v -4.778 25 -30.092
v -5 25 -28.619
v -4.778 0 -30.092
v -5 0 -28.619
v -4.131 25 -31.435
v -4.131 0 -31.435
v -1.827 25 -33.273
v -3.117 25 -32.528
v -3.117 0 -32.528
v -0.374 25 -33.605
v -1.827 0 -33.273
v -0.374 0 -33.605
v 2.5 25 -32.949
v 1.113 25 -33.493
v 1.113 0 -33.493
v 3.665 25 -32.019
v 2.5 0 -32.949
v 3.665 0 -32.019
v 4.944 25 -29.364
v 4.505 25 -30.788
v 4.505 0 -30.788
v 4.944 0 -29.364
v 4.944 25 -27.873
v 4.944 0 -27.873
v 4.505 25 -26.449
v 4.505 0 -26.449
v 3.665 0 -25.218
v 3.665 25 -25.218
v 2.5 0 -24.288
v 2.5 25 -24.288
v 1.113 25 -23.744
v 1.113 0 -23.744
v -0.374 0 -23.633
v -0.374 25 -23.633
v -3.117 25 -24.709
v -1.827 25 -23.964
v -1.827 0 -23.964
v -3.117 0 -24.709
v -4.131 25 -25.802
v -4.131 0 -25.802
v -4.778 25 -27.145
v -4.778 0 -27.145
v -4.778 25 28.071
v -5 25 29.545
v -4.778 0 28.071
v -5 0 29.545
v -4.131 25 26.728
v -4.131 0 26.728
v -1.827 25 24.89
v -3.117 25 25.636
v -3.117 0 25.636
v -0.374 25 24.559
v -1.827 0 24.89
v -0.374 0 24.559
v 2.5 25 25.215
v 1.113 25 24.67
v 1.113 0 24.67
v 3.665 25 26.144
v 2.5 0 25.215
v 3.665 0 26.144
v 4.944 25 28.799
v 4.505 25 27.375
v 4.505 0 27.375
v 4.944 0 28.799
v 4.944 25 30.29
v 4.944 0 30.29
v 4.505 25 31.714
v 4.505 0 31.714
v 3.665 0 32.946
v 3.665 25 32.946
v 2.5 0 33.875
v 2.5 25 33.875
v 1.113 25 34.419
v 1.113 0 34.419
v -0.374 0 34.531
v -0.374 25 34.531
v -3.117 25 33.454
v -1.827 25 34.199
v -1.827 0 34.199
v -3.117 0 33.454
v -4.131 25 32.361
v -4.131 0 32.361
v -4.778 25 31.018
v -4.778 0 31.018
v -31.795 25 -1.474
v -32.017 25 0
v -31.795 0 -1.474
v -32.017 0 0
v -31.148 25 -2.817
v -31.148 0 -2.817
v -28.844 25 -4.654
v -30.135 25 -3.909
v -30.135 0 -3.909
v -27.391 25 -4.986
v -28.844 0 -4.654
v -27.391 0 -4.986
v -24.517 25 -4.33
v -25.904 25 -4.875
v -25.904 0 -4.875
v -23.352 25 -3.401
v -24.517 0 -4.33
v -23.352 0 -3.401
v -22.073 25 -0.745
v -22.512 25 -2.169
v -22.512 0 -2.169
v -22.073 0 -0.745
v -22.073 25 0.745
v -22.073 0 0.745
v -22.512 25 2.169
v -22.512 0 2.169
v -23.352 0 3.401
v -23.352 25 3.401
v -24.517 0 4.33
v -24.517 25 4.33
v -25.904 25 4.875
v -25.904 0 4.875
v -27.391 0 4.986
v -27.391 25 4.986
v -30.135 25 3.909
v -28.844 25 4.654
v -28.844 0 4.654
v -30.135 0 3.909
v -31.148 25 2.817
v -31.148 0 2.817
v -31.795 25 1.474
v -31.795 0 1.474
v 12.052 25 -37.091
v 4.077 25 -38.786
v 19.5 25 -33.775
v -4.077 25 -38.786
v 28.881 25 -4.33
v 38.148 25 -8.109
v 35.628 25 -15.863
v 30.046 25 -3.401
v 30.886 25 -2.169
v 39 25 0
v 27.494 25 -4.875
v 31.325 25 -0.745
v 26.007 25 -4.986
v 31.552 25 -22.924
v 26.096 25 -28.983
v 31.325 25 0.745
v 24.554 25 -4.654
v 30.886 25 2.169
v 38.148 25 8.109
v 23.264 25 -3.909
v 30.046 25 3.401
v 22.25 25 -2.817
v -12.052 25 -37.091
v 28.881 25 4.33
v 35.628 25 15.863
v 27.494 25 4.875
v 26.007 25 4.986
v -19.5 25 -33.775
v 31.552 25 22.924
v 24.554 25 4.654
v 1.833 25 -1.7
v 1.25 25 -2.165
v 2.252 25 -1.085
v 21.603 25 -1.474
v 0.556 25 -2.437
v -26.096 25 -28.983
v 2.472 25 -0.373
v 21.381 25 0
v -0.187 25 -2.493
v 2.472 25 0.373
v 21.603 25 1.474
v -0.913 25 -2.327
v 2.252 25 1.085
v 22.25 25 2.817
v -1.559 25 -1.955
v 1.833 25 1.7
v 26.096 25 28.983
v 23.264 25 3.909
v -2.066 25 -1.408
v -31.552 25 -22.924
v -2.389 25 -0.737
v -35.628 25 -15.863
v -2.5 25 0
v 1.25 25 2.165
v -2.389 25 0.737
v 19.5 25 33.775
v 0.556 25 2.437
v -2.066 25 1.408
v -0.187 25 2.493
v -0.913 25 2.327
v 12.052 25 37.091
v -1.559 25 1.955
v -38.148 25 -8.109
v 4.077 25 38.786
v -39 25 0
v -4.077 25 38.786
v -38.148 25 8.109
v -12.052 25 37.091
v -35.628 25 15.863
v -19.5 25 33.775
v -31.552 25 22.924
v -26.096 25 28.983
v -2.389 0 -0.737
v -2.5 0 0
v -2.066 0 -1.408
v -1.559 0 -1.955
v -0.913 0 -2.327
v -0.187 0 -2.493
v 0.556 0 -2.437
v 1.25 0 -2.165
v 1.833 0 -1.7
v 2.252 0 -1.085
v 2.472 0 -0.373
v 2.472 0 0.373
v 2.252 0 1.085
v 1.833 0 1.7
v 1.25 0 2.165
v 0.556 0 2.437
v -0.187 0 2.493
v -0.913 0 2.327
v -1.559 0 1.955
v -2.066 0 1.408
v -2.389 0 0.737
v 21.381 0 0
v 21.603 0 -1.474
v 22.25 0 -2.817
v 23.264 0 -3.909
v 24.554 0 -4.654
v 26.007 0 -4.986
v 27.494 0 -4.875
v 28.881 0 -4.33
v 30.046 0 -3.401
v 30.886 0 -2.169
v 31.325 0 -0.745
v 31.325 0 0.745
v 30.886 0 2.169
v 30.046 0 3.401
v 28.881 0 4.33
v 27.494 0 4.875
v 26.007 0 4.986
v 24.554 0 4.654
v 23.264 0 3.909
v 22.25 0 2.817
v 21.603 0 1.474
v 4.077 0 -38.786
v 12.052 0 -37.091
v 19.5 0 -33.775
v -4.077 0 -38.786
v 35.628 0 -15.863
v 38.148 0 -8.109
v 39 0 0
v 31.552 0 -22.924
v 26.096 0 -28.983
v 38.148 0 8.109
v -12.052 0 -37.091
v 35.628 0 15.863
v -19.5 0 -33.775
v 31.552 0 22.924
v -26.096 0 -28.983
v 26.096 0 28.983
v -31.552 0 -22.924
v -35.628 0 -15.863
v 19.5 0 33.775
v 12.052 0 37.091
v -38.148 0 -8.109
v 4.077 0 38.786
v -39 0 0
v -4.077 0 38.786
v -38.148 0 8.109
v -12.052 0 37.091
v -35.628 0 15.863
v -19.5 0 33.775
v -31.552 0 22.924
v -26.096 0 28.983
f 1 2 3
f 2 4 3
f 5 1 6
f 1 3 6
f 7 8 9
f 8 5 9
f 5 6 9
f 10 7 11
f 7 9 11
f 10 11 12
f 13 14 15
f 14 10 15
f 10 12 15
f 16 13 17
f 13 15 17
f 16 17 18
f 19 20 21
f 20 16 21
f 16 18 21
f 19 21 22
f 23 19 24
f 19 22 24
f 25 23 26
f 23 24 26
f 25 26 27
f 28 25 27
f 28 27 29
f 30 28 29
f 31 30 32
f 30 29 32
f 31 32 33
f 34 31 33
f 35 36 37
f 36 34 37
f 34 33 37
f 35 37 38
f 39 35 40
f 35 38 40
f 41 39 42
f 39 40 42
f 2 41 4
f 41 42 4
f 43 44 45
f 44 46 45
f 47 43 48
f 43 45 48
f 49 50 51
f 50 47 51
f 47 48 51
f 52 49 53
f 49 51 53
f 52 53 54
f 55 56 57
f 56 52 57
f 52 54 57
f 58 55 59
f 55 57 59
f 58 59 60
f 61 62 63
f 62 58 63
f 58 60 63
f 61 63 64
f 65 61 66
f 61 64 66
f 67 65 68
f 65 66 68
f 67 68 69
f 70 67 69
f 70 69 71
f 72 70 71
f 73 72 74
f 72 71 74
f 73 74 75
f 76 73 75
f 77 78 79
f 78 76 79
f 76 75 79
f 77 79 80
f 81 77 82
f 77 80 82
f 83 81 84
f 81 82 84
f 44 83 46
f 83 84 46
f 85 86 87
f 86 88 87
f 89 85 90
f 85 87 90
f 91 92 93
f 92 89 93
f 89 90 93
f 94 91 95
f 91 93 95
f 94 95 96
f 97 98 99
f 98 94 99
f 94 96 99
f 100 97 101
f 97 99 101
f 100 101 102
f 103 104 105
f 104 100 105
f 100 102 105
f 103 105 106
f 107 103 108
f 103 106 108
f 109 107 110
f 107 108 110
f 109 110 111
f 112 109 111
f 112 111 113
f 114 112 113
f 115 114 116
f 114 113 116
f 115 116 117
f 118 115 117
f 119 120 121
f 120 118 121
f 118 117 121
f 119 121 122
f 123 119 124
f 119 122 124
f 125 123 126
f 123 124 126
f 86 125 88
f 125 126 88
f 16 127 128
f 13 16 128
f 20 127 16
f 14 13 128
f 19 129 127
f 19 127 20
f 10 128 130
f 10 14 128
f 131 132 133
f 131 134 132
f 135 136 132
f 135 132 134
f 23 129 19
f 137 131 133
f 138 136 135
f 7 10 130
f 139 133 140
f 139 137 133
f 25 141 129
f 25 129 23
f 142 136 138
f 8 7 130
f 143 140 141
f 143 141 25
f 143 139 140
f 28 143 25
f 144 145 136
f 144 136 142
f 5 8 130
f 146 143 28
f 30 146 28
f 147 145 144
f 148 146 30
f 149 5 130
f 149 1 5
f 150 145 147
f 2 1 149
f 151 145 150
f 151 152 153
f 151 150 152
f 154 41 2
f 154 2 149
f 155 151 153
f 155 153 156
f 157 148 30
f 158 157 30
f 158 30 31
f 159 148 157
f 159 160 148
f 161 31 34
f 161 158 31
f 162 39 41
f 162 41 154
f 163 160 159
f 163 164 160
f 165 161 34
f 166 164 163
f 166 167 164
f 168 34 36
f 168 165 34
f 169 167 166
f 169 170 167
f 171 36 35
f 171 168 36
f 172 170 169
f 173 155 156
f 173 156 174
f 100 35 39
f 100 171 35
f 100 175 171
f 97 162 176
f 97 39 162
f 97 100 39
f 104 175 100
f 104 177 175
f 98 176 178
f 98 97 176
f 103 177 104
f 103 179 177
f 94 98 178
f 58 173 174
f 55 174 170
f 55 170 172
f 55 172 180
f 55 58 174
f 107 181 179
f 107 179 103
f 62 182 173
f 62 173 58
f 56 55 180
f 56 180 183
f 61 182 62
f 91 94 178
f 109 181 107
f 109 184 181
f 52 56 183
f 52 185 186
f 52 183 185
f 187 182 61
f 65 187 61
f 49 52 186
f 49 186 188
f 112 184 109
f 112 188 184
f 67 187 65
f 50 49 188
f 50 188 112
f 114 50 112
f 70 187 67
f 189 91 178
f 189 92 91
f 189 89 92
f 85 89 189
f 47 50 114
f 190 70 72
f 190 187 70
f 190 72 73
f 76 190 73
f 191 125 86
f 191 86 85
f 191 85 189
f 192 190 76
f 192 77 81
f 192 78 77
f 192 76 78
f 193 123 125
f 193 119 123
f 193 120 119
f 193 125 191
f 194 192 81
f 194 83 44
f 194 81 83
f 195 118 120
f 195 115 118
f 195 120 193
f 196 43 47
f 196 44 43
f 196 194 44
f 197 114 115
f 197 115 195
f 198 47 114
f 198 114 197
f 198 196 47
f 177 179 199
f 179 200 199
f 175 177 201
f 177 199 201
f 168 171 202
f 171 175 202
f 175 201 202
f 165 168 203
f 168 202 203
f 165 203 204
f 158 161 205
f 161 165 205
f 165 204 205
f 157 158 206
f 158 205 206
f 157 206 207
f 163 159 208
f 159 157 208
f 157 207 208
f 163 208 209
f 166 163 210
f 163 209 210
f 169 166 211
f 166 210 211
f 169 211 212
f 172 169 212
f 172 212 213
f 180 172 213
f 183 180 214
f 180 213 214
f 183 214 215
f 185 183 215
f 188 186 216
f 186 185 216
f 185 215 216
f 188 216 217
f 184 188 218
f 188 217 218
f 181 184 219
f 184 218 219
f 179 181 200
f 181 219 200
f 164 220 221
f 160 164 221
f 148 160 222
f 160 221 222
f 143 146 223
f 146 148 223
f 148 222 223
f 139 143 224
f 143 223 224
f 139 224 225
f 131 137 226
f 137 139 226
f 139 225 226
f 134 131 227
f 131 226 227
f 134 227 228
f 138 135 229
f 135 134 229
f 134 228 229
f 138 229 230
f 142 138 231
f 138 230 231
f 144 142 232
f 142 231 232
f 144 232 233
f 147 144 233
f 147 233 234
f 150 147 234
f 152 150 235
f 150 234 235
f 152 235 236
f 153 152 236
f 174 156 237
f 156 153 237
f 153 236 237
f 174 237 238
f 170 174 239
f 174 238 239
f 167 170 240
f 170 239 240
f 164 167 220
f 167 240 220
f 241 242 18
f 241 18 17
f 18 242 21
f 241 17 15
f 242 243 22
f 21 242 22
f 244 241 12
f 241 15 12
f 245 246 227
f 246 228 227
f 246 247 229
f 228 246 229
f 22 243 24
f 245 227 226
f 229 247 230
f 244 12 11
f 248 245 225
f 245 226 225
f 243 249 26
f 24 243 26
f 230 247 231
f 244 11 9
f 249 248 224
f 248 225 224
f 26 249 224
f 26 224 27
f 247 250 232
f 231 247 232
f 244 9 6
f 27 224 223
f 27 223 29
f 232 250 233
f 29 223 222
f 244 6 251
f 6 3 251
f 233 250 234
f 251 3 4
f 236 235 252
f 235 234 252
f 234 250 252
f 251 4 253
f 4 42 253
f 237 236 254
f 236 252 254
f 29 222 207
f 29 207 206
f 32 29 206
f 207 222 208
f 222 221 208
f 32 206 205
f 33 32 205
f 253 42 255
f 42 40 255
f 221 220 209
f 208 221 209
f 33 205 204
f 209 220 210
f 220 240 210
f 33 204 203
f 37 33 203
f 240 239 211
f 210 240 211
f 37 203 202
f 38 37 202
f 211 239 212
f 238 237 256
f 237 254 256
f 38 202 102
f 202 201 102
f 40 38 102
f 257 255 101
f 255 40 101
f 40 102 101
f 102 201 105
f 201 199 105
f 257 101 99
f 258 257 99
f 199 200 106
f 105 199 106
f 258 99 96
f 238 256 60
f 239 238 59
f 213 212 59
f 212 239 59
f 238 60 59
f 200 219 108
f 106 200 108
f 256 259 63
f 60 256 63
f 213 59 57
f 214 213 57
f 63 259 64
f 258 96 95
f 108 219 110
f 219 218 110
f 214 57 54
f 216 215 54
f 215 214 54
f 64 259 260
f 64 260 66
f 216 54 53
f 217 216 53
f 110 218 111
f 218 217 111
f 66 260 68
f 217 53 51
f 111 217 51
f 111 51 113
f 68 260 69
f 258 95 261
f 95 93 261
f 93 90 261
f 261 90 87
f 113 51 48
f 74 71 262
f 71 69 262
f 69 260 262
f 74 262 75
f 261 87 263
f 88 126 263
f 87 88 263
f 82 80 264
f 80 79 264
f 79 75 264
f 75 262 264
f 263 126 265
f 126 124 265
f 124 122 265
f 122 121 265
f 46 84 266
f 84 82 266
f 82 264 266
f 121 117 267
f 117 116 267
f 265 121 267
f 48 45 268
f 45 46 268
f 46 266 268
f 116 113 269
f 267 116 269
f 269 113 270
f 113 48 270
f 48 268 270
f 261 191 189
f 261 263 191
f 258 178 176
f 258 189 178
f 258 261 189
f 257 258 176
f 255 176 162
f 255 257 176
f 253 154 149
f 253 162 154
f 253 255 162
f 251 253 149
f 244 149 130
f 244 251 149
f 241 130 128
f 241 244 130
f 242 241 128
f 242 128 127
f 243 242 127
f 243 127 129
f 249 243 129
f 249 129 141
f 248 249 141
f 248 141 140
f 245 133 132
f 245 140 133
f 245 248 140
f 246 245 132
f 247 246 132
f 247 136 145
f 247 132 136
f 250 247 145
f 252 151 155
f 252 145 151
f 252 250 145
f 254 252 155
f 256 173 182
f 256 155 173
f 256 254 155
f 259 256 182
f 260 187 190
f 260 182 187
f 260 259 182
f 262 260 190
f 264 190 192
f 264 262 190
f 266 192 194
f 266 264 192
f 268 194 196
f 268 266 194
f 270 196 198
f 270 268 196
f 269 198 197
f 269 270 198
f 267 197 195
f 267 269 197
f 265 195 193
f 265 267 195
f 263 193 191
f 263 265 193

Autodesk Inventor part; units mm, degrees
ref_plane "YZ Plane" through (0, 0, 0) normal (1, 0, 0) x (0, 1, 0)
ref_plane "XZ Plane" through (0, 0, 0) normal (0, 1, 0) x (-1, 0, 0)
ref_plane "XY Plane" through (0, 0, 0) normal (0, 0, 1) x (1, 0, 0)
sketch "Sketch1" plane through (0, 0, 0) normal (0, 1, 0) x (-1, 0, 0)
  circle A0 centre (0, 0) radius 39
  circle A1 centre (0, 0) radius 2.5
  circle A2 centre (27.0171, 0) radius 5
  circle A3 centre (0, -28.6186) radius 5
  circle A4 centre (-26.381, 0) radius 5
  circle A5 centre (0, 29.5447) radius 5
  dimension "d0" = 78
  dimension "d1" = 5
  dimension "d2" = 10
  dimension "d3" = 10
  dimension "d4" = 10
  dimension "d5" = 10
extrude "Extrusion1" add sketch "Sketch1" along normal blind 25
properties part number "roller1 grp17"
